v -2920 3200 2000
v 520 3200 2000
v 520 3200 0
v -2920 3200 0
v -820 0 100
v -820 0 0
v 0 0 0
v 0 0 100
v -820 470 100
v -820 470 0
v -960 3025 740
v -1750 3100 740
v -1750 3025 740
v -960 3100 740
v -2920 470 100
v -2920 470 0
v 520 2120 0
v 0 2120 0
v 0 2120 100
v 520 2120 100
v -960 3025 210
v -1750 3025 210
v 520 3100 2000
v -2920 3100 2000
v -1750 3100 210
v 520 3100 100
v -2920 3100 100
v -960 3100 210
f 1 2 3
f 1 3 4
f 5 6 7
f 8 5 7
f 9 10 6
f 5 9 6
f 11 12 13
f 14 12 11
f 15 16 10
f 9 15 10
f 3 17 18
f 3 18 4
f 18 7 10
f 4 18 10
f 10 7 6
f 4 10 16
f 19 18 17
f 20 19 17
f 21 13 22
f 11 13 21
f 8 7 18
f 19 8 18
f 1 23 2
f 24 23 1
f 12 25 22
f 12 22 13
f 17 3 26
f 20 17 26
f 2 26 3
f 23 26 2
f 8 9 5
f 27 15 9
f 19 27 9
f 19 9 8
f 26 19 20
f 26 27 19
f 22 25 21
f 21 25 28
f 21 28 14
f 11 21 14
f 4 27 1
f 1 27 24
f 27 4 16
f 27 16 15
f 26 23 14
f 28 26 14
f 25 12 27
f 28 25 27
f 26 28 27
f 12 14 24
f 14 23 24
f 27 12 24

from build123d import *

# Parameters (mm, degrees)
F1_DEPTH = 100
F2_W     = 3440
F2_H     = 2000
F3_DEPTH = 100
F4_W     = 790
F4_H     = 530
F5_DEPTH = 75


with BuildPart() as f1:
    # F0 (on Top) → F1 (new body)
    with BuildSketch(Plane.XY):
        Polygon((-820, 0), (0, 0), (0, 2120), (520, 2120), (520, 3100), (-2920, 3100), (-2920, 470), (-820, 470), align=None)
    extrude(amount=F1_DEPTH)

    # F2 (on face) → F3 (join)
    with BuildSketch(Plane(origin=(0, 3100, 0), x_dir=(-1, 0, 0), z_dir=(0, 1, 0))):
        with Locations((1200, 1000)):
            Rectangle(F2_W, F2_H)
    extrude(amount=F3_DEPTH)

    # F4 (on face) → F5 (join)
    with BuildSketch(Plane.XZ.offset(-3100)):
        with Locations((-1355, 475)):
            Rectangle(F4_W, F4_H)
    extrude(amount=F5_DEPTH)


solid = f1.part
